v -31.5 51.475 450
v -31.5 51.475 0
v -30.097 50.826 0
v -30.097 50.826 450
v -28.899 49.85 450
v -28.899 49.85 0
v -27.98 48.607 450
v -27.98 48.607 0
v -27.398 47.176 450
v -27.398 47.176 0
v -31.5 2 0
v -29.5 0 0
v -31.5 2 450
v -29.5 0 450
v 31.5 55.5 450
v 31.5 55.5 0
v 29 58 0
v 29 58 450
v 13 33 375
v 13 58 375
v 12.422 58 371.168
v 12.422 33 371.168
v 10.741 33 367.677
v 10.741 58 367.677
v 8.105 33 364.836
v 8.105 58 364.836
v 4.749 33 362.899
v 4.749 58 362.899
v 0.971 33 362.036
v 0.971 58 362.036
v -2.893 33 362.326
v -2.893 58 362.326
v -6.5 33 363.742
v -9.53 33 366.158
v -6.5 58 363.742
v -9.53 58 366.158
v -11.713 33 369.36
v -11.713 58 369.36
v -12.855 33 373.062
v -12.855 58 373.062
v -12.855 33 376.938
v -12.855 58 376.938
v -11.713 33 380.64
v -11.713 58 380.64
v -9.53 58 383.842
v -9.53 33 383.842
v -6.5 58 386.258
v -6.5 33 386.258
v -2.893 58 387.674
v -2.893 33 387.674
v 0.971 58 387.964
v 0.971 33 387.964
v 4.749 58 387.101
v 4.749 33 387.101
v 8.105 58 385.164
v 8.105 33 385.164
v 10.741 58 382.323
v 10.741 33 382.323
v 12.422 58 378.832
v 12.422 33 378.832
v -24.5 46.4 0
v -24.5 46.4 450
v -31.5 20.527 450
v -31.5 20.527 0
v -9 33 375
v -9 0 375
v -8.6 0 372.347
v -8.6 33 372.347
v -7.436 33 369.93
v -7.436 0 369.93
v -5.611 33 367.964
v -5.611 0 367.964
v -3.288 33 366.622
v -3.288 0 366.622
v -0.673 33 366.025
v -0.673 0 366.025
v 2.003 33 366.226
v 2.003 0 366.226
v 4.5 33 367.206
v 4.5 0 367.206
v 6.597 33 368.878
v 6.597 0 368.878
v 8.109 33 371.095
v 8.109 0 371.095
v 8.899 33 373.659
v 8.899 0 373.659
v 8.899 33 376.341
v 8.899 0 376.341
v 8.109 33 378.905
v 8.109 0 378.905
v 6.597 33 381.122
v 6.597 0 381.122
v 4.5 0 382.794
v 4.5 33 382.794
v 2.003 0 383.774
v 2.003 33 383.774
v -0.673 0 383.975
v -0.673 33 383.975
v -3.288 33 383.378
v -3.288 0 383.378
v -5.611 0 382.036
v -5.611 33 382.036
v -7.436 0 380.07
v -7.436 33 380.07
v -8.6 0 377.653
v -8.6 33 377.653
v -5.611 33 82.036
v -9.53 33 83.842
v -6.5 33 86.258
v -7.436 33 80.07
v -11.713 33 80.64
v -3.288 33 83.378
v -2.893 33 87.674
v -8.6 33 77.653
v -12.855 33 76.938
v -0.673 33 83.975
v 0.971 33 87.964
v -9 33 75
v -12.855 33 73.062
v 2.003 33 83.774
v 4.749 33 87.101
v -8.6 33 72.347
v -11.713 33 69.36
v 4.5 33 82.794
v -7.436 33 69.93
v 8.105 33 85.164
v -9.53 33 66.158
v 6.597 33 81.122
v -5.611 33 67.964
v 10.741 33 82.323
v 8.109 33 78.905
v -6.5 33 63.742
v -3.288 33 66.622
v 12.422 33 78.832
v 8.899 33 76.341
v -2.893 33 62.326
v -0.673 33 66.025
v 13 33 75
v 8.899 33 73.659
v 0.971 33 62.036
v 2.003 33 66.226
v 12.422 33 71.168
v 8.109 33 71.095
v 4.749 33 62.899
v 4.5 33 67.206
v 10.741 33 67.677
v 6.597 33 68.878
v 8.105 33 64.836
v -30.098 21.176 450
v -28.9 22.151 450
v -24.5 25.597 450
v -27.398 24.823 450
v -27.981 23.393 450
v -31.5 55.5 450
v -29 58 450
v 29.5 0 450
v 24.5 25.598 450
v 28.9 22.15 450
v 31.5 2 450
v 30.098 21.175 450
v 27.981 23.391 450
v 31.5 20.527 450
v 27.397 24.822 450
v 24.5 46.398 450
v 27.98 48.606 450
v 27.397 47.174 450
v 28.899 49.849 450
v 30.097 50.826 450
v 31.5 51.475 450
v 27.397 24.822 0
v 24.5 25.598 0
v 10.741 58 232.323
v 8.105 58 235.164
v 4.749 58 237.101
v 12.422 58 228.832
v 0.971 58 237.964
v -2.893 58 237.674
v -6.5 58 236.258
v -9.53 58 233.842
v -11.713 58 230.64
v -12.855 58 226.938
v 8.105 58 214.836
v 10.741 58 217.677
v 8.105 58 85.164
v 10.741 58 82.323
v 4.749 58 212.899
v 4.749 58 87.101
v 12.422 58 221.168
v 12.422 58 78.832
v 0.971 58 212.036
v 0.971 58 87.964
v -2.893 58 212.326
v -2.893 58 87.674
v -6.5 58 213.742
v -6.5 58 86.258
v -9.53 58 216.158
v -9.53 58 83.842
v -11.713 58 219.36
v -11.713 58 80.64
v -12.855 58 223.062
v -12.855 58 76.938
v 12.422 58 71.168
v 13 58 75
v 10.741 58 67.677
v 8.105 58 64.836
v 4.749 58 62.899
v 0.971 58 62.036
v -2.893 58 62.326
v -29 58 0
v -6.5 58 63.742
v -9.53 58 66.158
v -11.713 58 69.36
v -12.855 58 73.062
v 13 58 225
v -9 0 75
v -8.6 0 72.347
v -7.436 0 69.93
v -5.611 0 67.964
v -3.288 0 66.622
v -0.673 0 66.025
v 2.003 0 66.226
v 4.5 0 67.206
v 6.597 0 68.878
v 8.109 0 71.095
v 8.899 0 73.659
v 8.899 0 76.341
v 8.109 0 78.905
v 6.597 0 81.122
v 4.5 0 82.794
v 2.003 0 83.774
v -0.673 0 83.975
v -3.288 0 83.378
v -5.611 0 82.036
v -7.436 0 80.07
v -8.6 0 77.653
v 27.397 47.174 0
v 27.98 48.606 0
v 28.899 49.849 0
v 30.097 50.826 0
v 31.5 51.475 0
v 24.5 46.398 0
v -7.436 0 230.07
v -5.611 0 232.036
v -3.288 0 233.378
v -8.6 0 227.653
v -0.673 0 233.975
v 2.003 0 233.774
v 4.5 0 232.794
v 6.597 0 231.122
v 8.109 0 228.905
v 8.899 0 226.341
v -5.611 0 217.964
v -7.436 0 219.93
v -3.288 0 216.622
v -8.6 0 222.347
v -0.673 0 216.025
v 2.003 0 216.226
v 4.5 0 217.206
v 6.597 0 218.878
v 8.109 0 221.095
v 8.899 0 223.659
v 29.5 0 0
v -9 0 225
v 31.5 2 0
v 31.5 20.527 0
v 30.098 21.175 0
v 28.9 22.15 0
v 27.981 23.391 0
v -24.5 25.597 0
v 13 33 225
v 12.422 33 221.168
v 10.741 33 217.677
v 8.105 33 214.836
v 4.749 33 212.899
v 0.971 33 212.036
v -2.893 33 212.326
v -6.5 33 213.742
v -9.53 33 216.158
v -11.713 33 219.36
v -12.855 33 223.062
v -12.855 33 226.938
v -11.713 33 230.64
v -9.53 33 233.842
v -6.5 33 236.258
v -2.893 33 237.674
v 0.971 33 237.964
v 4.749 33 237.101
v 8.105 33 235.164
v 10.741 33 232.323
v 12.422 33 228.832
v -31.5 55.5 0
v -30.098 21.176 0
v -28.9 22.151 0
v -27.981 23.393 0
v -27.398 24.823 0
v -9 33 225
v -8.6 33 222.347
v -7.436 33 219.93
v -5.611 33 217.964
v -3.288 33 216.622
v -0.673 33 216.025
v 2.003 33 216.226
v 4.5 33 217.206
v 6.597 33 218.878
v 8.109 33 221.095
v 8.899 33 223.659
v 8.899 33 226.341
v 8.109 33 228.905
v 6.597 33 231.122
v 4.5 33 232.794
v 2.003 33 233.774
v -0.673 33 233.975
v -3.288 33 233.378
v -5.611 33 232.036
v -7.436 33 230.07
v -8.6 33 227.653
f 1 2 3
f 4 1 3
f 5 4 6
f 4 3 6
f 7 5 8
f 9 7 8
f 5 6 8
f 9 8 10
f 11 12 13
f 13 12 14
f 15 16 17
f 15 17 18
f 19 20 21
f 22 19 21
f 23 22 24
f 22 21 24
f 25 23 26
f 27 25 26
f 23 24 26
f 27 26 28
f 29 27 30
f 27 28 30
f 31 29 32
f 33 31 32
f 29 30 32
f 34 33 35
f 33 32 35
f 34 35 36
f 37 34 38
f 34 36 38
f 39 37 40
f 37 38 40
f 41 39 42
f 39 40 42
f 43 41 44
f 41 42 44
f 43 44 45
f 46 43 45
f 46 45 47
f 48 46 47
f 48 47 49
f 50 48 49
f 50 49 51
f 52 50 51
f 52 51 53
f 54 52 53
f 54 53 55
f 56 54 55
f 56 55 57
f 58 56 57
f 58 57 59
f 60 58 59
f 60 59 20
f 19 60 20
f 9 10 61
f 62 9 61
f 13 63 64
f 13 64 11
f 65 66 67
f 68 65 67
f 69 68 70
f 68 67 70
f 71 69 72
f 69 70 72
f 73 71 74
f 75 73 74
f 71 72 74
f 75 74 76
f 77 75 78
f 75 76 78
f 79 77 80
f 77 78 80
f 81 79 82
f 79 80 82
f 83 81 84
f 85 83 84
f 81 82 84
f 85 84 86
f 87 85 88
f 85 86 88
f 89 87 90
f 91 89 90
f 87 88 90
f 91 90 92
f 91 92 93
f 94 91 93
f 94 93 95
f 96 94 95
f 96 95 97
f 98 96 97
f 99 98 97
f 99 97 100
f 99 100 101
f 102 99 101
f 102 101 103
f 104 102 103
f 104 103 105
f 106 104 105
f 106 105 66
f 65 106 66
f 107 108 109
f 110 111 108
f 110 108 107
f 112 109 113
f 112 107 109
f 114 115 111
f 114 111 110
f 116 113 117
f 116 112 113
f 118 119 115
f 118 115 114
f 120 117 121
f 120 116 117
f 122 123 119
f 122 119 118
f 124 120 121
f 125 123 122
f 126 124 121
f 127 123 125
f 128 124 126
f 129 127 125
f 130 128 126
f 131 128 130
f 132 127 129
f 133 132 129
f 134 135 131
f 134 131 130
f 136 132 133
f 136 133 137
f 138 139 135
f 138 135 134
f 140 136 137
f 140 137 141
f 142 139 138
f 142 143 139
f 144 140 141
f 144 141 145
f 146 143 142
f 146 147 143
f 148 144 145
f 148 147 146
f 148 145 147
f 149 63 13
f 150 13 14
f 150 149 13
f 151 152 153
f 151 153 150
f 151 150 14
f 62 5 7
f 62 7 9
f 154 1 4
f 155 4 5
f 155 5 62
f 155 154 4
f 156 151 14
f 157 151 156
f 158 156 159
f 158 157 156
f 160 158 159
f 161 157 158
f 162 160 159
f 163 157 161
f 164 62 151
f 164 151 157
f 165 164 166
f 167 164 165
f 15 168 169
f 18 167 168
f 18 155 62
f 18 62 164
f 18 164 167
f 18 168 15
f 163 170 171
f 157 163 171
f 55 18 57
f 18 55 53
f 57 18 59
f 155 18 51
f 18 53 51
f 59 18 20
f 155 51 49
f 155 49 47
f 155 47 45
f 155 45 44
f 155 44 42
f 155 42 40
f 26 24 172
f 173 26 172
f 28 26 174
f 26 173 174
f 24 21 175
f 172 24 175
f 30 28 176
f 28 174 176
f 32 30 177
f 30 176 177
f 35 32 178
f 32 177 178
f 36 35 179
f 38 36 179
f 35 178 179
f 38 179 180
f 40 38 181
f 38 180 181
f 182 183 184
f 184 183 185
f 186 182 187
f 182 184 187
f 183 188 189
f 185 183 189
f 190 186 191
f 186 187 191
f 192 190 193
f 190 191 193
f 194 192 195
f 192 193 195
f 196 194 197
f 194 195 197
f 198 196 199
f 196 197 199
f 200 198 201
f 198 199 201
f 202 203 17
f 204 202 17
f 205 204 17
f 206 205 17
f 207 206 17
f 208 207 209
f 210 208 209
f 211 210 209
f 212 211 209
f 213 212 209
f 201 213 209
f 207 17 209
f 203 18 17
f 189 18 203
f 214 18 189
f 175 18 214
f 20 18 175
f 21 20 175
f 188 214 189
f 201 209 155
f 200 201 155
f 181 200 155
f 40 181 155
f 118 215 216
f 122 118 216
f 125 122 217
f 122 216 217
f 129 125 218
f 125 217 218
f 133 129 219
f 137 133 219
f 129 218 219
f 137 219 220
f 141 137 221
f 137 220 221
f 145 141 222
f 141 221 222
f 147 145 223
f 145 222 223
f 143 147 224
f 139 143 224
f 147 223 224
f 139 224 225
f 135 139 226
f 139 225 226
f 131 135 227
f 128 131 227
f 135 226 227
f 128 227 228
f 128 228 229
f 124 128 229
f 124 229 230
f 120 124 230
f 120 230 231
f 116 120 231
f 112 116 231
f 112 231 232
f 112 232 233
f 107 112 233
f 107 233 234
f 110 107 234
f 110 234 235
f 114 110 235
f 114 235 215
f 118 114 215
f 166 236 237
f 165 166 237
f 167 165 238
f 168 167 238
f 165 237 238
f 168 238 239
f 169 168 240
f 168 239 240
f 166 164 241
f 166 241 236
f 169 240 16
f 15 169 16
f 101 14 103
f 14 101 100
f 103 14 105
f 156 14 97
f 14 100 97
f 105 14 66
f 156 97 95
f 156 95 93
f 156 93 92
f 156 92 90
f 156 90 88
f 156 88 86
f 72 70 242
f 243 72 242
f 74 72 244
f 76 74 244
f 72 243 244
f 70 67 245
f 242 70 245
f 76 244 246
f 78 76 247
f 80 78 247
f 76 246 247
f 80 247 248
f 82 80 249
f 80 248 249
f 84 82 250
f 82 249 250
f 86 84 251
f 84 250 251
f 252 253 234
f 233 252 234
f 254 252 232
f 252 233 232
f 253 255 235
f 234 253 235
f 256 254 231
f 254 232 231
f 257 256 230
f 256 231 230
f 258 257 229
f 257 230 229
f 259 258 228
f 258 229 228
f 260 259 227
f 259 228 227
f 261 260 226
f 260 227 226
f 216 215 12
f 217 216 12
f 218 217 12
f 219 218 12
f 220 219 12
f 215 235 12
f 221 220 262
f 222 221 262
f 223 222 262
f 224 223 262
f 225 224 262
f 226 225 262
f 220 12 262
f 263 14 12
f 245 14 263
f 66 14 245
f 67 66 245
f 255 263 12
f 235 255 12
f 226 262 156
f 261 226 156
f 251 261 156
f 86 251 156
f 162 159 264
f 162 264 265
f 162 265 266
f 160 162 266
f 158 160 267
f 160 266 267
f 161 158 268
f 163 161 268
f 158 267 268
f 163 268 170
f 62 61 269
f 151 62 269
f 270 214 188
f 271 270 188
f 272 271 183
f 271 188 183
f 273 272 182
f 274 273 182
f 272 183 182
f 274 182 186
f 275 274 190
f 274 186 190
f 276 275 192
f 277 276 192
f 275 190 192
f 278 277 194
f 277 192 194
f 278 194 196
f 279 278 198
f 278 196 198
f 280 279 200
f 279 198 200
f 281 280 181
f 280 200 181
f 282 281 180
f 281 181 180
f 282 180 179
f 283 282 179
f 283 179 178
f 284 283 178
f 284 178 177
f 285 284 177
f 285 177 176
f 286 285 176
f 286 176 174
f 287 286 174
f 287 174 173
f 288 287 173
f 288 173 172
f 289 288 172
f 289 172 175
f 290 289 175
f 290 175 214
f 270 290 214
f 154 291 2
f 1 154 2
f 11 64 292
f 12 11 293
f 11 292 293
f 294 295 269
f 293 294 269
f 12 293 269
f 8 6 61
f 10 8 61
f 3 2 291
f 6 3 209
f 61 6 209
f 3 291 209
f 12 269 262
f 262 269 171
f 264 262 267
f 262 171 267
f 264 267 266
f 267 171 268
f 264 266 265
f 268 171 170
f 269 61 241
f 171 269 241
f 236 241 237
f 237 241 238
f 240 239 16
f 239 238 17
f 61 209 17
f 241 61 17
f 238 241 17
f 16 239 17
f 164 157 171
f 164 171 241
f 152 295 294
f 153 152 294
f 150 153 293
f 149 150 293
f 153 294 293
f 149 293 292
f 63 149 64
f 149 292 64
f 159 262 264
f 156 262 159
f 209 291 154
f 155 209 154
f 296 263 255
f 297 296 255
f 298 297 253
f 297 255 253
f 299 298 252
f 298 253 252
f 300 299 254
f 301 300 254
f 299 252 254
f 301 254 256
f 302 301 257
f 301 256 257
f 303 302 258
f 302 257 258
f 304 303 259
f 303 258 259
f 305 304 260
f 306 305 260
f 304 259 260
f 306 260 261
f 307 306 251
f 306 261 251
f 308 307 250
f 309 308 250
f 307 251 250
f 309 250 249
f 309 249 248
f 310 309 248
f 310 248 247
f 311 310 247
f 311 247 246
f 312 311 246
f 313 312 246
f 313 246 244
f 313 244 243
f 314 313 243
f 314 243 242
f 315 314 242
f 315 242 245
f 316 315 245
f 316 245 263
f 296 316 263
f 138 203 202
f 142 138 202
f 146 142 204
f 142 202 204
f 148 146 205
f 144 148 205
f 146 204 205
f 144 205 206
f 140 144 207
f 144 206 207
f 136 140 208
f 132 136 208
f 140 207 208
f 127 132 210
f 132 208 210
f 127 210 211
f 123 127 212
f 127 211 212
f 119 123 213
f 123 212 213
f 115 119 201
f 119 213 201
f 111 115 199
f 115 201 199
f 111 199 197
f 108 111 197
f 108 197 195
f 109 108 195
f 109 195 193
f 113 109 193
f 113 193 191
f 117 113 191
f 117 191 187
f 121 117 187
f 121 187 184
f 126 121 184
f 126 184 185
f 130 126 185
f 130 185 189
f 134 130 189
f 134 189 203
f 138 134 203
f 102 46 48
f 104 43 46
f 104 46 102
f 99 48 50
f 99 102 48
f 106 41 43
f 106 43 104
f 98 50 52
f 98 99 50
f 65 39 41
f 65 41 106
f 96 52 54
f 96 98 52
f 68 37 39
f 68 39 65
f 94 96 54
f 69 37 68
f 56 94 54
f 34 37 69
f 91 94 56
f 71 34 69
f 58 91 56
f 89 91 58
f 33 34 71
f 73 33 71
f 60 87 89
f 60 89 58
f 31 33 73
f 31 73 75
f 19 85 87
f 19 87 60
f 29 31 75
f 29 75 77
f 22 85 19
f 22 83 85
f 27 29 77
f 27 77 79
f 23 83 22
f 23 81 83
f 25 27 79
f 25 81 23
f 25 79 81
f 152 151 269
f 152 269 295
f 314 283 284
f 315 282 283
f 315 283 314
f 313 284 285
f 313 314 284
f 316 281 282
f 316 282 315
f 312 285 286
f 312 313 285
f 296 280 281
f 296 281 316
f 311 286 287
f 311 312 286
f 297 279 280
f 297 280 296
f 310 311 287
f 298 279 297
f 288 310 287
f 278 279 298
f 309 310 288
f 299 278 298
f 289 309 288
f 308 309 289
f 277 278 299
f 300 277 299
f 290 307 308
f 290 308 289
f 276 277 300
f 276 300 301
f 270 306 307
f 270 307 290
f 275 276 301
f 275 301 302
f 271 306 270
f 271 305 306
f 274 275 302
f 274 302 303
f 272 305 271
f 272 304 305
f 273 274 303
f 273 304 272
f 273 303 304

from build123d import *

# Parameters (mm, degrees)
RESSALTO_EXTRUS_O1_DEPTH                             = 450
REBAIXO_PARA_PARAFUSO_DE_CABE_A_SEXTAVAD_D           = 18
REBAIXO_PARA_PARAFUSO_DE_CABE_A_SEXTAVAD_DEPTH       = 58
REBAIXO_PARA_PARAFUSO_DE_CABE_A_SEXTAVAD_CBORE_D     = 26
REBAIXO_PARA_PARAFUSO_DE_CABE_A_SEXTAVAD_CBORE_DEPTH = 25
CHANFRO1_SIZE2                                       = 2.500287455
CHANFRO1_SIZE                                        = 2.500257245
CHANFRO2_SIZE2                                       = 2.500423779
CHANFRO2_SIZE                                        = 2.500287455
CHANFRO3_SIZE                                        = 2


with BuildPart() as part:
    # Esboço1 → Ressalto-extrusão1 (new body)
    with BuildSketch(Plane.XY):
        with BuildLine():
            Line((-31.5, 20.527298986), (-31.5, 0))
            Line((-31.5, 0), (31.5, 0))
            Line((31.5, 0), (31.5, 20.527298986))
            ThreePointArc((31.5, 20.527298986), (28.900076881, 22.150342104), (27.397266061, 24.82156445))
            Line((27.397266061, 24.82156445), (24.5, 25.597882749))
            Line((24.5, 25.597882749), (24.5, 46.397686197))
            Line((24.5, 46.397686197), (27.397119712, 47.17387922))
            ThreePointArc((27.397119712, 47.17387922), (28.898613337, 49.848990738), (31.5, 51.474872705))
            Line((31.5, 51.474872705), (31.5, 58))
            Line((31.5, 58), (-31.5, 58))
            Line((-31.5, 58), (-31.5, 51.474872705))
            ThreePointArc((-31.5, 51.474872705), (-28.899411057, 49.849685923), (-27.397802135, 47.175837466))
            Line((-27.397802135, 47.175837466), (-24.5, 46.399706372))
            Line((-24.5, 46.399706372), (-24.5, 25.596973237))
            Line((-24.5, 25.596973237), (-27.397939574, 24.823365186))
            ThreePointArc((-27.397939574, 24.823365186), (-28.900095464, 22.151244343), (-31.5, 20.527298986))
        make_face()
    extrude(amount=RESSALTO_EXTRUS_O1_DEPTH)

    # Rebaixo para parafuso de cabeça sextavada de M161
    with Locations(Plane(origin=(0, 58, 0), x_dir=(1, 0, 0), z_dir=(0, 1, 0))):
        with Locations((0, -75), (0, -1425), (0, -1275), (0, -1125), (0, -975), (0, -825), (0, -675), (0, -525), (0, -375), (0, -225)):
            CounterBoreHole(REBAIXO_PARA_PARAFUSO_DE_CABE_A_SEXTAVAD_D / 2, REBAIXO_PARA_PARAFUSO_DE_CABE_A_SEXTAVAD_CBORE_D / 2, REBAIXO_PARA_PARAFUSO_DE_CABE_A_SEXTAVAD_CBORE_DEPTH, depth=REBAIXO_PARA_PARAFUSO_DE_CABE_A_SEXTAVAD_DEPTH)

    # Chanfro1
    chanfro1_edges = [part.edges().sort_by_distance(p)[0] for p in [
        (-31.5, 58, 225),
    ]]
    chamfer(chanfro1_edges, length=CHANFRO1_SIZE, length2=CHANFRO1_SIZE2)

    # Chanfro2
    chanfro2_edges = [part.edges().sort_by_distance(p)[0] for p in [
        (31.5, 58, 225),
    ]]
    chamfer(chanfro2_edges, length=CHANFRO2_SIZE, length2=CHANFRO2_SIZE2)

    # Chanfro3
    chanfro3_edges = [part.edges().sort_by_distance(p)[0] for p in [
        (31.5, 0, 225),
        (-31.5, 0, 225),
    ]]
    chamfer(chanfro3_edges, length=CHANFRO3_SIZE)


solid = part.part
